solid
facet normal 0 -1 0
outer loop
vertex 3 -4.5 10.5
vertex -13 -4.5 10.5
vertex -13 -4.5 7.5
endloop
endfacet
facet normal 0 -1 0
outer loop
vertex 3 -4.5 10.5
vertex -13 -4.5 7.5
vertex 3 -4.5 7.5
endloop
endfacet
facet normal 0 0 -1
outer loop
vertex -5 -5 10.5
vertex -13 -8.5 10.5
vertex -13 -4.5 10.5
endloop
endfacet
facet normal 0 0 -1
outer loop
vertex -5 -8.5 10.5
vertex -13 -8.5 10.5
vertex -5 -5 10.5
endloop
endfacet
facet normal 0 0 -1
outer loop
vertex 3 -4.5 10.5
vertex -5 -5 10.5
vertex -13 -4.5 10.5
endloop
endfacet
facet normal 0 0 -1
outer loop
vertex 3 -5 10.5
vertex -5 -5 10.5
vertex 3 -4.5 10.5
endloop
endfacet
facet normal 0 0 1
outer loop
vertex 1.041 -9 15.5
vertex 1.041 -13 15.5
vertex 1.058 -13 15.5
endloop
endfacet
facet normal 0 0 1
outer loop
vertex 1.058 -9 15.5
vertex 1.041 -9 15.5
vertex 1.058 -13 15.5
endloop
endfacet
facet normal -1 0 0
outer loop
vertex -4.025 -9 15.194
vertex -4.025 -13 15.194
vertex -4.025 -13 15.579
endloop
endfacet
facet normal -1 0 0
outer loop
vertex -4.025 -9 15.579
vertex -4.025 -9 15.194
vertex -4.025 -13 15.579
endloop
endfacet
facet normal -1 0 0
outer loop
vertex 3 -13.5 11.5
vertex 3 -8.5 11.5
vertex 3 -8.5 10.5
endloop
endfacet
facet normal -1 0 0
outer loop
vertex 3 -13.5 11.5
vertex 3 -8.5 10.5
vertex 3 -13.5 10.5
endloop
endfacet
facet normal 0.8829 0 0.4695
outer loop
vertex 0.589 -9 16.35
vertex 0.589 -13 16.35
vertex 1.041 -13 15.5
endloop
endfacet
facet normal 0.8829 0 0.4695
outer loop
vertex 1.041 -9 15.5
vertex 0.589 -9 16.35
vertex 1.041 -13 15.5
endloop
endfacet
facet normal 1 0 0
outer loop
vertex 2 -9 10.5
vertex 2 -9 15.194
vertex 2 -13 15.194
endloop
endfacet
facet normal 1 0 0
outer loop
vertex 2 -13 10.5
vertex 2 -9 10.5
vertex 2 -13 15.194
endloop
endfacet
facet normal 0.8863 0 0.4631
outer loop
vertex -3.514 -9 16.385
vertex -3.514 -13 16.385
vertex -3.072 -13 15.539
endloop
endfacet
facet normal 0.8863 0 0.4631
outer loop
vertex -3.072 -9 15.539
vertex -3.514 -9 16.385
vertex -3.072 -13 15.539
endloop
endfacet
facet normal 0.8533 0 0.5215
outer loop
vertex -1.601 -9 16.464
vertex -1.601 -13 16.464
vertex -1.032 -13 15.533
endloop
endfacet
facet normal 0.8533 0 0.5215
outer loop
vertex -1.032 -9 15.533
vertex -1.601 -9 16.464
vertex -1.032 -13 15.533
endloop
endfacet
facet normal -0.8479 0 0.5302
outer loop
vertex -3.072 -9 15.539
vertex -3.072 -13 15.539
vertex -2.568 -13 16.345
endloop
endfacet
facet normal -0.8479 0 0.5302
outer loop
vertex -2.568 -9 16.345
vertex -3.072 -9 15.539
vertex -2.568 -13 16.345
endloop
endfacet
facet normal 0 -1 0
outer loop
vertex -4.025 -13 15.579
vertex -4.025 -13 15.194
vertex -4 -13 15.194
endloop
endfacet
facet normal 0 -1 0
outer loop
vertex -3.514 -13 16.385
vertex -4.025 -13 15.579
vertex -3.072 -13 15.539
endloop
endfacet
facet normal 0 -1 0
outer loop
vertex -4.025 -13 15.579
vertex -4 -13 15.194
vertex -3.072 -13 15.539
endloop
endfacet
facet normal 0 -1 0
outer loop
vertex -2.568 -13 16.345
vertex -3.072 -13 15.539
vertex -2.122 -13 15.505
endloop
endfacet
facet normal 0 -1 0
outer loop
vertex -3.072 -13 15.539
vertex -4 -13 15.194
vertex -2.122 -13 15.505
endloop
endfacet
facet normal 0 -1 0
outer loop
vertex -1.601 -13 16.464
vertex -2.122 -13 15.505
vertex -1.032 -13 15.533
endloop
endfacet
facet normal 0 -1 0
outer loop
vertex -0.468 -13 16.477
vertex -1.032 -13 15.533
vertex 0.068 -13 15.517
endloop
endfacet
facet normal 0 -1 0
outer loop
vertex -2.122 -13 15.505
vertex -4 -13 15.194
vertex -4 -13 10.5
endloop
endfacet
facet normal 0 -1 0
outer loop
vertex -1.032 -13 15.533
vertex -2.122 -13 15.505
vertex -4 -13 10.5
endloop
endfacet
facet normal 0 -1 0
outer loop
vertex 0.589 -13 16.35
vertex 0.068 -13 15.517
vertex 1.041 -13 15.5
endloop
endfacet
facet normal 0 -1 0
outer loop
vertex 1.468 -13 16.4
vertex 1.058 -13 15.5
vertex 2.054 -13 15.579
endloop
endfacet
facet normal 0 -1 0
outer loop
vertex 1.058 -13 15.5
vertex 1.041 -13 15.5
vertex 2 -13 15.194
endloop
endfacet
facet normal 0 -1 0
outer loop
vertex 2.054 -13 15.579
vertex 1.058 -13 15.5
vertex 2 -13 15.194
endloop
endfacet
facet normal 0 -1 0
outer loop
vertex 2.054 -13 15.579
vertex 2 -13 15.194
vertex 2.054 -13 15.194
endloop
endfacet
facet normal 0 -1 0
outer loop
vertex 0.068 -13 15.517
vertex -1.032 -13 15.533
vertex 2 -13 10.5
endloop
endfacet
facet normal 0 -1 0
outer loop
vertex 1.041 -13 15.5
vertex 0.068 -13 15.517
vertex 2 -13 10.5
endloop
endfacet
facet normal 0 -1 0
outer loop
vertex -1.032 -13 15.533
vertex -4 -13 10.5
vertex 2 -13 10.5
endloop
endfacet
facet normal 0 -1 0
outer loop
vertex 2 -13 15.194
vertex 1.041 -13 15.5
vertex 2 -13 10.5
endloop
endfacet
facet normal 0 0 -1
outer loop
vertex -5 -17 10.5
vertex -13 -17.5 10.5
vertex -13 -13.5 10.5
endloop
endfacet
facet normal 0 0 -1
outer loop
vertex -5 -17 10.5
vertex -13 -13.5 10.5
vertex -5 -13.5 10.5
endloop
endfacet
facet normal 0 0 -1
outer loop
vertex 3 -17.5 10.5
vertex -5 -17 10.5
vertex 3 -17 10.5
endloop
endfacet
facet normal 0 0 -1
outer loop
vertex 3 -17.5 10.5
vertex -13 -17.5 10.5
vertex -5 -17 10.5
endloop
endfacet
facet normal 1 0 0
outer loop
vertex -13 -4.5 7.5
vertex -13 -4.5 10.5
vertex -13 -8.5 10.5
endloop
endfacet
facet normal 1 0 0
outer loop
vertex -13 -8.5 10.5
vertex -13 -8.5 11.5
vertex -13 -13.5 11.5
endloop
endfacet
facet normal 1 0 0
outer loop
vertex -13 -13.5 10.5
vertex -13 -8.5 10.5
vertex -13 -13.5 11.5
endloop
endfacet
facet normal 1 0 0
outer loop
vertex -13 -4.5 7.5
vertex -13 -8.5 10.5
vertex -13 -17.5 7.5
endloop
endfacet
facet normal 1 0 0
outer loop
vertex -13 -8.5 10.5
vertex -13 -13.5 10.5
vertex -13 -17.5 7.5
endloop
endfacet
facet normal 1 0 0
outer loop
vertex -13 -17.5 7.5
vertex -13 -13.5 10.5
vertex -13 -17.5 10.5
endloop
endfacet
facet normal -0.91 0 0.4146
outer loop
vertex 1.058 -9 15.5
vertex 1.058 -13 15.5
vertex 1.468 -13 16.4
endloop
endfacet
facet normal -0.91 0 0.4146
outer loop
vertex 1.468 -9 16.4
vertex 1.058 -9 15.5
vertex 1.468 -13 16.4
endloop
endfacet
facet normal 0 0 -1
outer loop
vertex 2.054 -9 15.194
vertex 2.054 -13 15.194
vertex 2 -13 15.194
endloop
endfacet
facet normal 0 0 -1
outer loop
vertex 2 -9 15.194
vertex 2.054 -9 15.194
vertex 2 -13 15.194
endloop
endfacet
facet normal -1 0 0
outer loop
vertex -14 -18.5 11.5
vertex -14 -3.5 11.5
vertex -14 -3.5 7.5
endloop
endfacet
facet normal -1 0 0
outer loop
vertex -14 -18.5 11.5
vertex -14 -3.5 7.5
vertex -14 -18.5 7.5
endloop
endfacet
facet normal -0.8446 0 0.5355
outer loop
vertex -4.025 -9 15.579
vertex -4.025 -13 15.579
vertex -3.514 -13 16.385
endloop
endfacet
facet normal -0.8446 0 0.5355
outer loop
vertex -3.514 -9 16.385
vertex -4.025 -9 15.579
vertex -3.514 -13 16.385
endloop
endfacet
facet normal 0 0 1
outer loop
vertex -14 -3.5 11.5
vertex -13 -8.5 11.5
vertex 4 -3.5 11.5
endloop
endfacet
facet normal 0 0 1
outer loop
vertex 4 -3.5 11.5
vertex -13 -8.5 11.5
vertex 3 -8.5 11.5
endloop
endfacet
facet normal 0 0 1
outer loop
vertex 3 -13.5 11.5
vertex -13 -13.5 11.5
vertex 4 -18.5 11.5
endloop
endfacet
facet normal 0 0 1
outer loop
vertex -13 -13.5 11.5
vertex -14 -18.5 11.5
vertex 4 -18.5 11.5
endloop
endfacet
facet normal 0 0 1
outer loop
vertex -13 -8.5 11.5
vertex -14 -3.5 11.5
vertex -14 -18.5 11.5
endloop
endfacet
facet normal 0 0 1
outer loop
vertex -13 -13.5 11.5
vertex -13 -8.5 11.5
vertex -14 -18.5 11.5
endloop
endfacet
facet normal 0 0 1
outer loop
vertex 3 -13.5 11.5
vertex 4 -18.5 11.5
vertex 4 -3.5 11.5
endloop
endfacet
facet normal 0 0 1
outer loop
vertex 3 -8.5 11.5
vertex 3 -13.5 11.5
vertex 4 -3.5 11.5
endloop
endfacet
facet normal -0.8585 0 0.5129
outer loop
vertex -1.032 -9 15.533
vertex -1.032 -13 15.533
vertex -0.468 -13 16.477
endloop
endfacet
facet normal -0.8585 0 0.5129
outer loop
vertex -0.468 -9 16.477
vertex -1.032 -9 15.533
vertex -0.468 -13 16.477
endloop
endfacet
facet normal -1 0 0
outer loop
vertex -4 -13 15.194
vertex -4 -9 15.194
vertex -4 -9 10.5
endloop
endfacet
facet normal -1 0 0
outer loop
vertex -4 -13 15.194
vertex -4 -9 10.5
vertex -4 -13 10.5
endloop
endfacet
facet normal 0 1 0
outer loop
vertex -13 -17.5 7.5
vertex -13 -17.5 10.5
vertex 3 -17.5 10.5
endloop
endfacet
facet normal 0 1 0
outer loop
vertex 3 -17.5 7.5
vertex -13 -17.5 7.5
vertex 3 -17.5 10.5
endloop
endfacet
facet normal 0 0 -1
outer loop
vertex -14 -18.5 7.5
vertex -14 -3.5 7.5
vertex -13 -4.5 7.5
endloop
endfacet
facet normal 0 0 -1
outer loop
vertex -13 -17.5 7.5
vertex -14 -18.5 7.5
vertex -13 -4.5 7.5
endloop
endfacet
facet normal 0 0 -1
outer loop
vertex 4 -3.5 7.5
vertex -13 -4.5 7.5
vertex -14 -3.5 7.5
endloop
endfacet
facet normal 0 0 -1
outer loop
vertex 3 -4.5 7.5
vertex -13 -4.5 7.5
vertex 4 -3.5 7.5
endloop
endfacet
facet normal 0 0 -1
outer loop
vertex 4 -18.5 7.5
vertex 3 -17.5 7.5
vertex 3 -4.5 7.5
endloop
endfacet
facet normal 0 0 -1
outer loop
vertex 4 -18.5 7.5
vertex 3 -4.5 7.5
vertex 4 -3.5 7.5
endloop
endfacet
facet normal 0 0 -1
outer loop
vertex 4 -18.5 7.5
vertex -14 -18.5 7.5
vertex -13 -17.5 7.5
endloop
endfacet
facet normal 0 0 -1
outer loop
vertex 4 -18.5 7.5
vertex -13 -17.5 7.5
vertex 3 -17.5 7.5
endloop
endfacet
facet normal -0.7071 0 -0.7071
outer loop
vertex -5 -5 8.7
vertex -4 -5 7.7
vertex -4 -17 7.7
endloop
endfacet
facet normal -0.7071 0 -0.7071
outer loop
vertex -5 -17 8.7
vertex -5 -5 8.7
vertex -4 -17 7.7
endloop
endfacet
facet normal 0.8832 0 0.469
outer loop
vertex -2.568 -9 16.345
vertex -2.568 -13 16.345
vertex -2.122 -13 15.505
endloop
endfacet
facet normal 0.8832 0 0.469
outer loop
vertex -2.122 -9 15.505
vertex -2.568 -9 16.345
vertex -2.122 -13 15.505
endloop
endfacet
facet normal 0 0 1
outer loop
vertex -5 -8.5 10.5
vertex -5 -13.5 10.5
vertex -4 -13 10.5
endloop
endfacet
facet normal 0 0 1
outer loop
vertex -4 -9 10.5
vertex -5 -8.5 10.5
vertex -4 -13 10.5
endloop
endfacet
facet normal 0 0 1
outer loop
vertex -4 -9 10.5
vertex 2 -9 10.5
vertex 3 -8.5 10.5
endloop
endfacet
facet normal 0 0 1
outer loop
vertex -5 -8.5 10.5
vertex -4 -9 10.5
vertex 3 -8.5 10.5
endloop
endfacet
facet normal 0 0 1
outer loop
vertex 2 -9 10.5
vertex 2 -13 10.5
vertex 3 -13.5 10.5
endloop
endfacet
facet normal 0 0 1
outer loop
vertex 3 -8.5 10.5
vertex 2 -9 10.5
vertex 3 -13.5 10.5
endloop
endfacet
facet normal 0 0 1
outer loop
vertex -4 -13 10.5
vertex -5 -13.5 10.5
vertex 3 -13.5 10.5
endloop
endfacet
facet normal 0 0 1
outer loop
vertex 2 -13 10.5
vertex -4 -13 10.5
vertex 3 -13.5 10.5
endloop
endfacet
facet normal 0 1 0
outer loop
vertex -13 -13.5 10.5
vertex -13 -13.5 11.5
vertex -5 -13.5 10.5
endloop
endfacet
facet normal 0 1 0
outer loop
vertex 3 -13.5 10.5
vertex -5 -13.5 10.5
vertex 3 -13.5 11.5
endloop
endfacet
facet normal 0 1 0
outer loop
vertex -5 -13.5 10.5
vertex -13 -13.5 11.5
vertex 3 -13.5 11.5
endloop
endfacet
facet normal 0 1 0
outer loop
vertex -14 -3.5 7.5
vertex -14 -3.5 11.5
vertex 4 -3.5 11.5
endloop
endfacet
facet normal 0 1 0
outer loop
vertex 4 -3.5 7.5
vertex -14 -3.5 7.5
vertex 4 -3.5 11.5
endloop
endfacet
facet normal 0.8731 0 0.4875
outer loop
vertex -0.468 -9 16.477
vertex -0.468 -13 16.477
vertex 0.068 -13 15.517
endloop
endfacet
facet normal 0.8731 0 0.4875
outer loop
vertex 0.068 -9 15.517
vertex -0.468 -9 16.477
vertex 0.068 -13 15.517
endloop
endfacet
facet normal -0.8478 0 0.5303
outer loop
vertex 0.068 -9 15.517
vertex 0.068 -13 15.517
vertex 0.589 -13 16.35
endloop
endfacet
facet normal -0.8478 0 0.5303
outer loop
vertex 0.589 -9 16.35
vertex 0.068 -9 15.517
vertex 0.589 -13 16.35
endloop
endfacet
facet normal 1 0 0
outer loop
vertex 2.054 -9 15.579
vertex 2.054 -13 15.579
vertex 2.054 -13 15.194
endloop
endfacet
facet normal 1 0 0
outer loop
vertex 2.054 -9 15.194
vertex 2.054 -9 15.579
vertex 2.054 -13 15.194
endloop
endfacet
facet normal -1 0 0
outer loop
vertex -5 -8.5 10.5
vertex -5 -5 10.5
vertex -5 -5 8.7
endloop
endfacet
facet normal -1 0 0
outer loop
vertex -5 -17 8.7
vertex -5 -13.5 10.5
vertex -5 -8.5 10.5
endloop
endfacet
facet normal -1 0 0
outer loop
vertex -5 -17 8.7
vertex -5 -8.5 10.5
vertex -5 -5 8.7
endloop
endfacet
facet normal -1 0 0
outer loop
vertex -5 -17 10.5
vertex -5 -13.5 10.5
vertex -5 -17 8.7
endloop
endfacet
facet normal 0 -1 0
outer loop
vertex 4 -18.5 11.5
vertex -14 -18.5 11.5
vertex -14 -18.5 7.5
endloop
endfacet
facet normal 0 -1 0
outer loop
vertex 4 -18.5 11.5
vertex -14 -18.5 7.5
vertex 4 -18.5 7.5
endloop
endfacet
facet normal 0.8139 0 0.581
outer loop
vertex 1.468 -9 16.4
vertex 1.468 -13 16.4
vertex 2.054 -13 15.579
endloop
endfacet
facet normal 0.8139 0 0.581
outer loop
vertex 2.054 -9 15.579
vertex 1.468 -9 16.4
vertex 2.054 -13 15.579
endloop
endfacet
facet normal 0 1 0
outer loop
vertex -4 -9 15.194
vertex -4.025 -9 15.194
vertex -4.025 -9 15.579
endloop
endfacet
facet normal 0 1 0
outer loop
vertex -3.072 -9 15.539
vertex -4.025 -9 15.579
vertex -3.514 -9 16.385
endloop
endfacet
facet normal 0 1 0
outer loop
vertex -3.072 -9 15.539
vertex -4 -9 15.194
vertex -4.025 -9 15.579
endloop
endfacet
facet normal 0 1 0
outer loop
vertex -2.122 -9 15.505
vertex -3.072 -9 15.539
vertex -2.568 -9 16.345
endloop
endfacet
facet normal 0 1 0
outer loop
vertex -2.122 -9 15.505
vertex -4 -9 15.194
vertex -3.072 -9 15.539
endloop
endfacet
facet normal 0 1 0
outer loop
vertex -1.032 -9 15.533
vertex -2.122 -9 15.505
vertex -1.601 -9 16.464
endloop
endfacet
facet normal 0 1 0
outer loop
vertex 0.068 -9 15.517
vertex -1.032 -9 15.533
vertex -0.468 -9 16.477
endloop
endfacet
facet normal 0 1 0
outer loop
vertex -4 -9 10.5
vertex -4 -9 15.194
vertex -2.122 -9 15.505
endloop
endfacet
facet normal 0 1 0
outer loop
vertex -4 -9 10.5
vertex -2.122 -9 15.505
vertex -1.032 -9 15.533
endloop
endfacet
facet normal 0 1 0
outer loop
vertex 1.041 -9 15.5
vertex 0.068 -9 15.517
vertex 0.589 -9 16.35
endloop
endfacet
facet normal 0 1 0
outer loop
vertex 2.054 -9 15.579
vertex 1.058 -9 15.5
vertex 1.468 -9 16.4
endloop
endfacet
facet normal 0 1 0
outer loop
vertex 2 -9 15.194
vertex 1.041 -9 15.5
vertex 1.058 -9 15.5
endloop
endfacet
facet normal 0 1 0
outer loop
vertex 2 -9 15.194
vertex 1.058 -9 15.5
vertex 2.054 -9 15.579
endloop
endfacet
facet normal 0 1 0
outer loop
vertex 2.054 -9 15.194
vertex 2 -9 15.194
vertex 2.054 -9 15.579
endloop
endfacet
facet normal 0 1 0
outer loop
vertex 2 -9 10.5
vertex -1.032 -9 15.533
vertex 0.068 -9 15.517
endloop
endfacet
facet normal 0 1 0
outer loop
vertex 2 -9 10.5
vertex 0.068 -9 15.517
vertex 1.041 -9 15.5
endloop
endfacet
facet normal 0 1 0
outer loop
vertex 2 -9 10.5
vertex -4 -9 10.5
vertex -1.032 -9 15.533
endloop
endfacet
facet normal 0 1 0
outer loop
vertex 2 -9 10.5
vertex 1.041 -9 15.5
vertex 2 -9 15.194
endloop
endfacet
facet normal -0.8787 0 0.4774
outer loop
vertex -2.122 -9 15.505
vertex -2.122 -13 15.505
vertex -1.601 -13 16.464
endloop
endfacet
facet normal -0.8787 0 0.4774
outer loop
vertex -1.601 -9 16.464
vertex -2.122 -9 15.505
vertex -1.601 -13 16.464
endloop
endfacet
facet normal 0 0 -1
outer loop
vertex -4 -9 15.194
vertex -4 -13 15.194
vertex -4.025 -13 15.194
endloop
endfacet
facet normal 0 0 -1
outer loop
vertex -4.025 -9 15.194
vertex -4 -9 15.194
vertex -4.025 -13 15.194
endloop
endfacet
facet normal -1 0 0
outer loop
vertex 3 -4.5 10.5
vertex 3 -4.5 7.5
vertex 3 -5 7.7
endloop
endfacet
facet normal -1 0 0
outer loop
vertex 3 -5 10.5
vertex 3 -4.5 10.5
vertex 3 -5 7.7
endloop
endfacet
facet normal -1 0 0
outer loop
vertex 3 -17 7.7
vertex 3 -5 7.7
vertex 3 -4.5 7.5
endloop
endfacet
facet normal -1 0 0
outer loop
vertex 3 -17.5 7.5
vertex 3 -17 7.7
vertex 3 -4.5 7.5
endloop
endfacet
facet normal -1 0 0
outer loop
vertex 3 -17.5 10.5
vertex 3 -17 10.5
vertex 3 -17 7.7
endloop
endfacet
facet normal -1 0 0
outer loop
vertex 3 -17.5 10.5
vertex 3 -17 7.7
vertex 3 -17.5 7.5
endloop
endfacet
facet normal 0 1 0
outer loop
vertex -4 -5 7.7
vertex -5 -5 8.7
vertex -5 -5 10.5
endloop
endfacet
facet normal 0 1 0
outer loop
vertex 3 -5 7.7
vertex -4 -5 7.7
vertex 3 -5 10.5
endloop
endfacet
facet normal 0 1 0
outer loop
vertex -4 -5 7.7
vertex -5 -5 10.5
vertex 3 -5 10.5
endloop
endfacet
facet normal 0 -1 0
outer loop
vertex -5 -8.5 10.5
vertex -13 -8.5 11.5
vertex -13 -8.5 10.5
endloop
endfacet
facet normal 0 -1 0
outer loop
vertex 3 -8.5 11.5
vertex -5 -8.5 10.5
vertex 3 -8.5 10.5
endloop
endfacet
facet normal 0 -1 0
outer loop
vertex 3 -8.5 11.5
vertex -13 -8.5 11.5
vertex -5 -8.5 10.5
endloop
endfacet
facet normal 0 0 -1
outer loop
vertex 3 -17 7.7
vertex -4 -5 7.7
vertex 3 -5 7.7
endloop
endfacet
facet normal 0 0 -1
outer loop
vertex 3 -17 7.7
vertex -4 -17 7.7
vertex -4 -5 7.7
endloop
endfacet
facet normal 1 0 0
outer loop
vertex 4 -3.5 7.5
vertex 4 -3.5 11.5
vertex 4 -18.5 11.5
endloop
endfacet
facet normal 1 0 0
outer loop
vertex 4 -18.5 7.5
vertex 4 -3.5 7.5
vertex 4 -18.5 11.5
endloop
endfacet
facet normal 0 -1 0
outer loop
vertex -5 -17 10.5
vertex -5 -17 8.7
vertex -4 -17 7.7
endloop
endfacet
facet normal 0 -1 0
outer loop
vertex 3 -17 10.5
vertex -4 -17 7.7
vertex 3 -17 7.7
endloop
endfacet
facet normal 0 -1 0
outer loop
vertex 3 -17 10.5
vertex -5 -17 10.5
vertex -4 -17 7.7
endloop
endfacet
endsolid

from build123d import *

# Parameters (mm, degrees)
PAD_DEPTH                    = 4
BOX055_W                     = 6
BOX055_H                     = 4
BOX055_DEPTH                 = 5
BOX053_W                     = 16
BOX053_H                     = 5
BOX053_DEPTH                 = 10
BOX052_W                     = 16
BOX052_H                     = 13
BOX052_DEPTH                 = 3
BOX051_W                     = 18
BOX051_H                     = 15
BOX051_DEPTH                 = 4
BOX054_W                     = 8
BOX054_H                     = 12
BOX054_DEPTH                 = 2.8
CHAMFER002_SIZE              = 1
FUSION002030_PLACEMENT_ANGLE = 180


with BuildPart() as pad:
    # Sketch → Pad (new body)
    with BuildSketch(Plane.XZ):
        Polygon((1.974622, -4.079123), (2.485922, -4.884556), (2.927797, -4.039041), (3.431991, -4.84464), (3.877564, -4.005196), (4.398553, -4.963919), (4.968336, -4.033368), (5.532483, -4.976998), (6.067618, -4.016618), (6.588753, -4.85016), (7.050054, -3.982073), (7.468007, -4.900089), (8.054056, -4.079123), (8.054056, -3.693932), (1.974622, -3.693932), align=None)
    extrude(amount=PAD_DEPTH)


with BuildPart() as fusion002029:
    # Box055 → Box055 (new body)
    with BuildSketch(Plane(origin=(2, -4, -4), x_dir=(1, 0, 0), z_dir=(0, 0, 1))):
        with Locations((3, 2)):
            Rectangle(BOX055_W, BOX055_H)
    extrude(amount=BOX055_DEPTH)

    # Fusion002029: union Pad
    add(pad.part)


with BuildPart() as fusion002029_1:
    # Fusion002029 placement: moved
    add(fusion002029.part.moved(Location((8, 9.5, 0))))


with BuildPart() as cubo053:
    # Box053 → Box053 (new body)
    with BuildSketch(Plane(origin=(1, 5, -5), x_dir=(1, 0, 0), z_dir=(0, 0, 1))):
        with Locations((8, 2.5)):
            Rectangle(BOX053_W, BOX053_H)
    extrude(amount=BOX053_DEPTH)


with BuildPart() as cubo052:
    # Box052 → Box052 (new body)
    with BuildSketch(Plane(origin=(1, 1, 1), x_dir=(1, 0, 0), z_dir=(0, 0, 1))):
        with Locations((8, 6.5)):
            Rectangle(BOX052_W, BOX052_H)
    extrude(amount=BOX052_DEPTH)


with BuildPart() as cut074:
    # Box051 → Box051 (new body)
    with BuildSketch(Plane.XY):
        with Locations((9, 7.5)):
            Rectangle(BOX051_W, BOX051_H)
    extrude(amount=BOX051_DEPTH)

    # Cut073: cut Cubo052
    add(cubo052.part, mode=Mode.SUBTRACT)

    # Cut074: cut Cubo053
    add(cubo053.part, mode=Mode.SUBTRACT)


with BuildPart() as fusion002030:
    # Box054 → Box054 (new body)
    with BuildSketch(Plane(origin=(8, 1.5, 1), x_dir=(1, 0, 0), z_dir=(0, 0, 1))):
        with Locations((4, 6)):
            Rectangle(BOX054_W, BOX054_H)
    extrude(amount=BOX054_DEPTH)

    # Chamfer002
    chamfer002_edges = [fusion002030.edges().sort_by_distance(p)[0] for p in [
        (8, 7.5, 3.8),
    ]]
    chamfer(chamfer002_edges, length=CHAMFER002_SIZE)


with BuildPart() as fusion002030_1:
    # Chamfer002 placement: moved
    add(fusion002030.part.moved(Location((1, 0, 0))))

    # Fusion002030: union Fusion002029, Cut074
    add(fusion002029_1.part)
    add(cut074.part)


with BuildPart() as fusion002030_2:
    # Fusion002030 placement: moved
    add(fusion002030_1.part.moved(Location((-14, -3.5, 11.5))).rotate(Axis((-14, -3.5, 11.5), (1, 0, 0)), FUSION002030_PLACEMENT_ANGLE))


solid = fusion002030_2.part
